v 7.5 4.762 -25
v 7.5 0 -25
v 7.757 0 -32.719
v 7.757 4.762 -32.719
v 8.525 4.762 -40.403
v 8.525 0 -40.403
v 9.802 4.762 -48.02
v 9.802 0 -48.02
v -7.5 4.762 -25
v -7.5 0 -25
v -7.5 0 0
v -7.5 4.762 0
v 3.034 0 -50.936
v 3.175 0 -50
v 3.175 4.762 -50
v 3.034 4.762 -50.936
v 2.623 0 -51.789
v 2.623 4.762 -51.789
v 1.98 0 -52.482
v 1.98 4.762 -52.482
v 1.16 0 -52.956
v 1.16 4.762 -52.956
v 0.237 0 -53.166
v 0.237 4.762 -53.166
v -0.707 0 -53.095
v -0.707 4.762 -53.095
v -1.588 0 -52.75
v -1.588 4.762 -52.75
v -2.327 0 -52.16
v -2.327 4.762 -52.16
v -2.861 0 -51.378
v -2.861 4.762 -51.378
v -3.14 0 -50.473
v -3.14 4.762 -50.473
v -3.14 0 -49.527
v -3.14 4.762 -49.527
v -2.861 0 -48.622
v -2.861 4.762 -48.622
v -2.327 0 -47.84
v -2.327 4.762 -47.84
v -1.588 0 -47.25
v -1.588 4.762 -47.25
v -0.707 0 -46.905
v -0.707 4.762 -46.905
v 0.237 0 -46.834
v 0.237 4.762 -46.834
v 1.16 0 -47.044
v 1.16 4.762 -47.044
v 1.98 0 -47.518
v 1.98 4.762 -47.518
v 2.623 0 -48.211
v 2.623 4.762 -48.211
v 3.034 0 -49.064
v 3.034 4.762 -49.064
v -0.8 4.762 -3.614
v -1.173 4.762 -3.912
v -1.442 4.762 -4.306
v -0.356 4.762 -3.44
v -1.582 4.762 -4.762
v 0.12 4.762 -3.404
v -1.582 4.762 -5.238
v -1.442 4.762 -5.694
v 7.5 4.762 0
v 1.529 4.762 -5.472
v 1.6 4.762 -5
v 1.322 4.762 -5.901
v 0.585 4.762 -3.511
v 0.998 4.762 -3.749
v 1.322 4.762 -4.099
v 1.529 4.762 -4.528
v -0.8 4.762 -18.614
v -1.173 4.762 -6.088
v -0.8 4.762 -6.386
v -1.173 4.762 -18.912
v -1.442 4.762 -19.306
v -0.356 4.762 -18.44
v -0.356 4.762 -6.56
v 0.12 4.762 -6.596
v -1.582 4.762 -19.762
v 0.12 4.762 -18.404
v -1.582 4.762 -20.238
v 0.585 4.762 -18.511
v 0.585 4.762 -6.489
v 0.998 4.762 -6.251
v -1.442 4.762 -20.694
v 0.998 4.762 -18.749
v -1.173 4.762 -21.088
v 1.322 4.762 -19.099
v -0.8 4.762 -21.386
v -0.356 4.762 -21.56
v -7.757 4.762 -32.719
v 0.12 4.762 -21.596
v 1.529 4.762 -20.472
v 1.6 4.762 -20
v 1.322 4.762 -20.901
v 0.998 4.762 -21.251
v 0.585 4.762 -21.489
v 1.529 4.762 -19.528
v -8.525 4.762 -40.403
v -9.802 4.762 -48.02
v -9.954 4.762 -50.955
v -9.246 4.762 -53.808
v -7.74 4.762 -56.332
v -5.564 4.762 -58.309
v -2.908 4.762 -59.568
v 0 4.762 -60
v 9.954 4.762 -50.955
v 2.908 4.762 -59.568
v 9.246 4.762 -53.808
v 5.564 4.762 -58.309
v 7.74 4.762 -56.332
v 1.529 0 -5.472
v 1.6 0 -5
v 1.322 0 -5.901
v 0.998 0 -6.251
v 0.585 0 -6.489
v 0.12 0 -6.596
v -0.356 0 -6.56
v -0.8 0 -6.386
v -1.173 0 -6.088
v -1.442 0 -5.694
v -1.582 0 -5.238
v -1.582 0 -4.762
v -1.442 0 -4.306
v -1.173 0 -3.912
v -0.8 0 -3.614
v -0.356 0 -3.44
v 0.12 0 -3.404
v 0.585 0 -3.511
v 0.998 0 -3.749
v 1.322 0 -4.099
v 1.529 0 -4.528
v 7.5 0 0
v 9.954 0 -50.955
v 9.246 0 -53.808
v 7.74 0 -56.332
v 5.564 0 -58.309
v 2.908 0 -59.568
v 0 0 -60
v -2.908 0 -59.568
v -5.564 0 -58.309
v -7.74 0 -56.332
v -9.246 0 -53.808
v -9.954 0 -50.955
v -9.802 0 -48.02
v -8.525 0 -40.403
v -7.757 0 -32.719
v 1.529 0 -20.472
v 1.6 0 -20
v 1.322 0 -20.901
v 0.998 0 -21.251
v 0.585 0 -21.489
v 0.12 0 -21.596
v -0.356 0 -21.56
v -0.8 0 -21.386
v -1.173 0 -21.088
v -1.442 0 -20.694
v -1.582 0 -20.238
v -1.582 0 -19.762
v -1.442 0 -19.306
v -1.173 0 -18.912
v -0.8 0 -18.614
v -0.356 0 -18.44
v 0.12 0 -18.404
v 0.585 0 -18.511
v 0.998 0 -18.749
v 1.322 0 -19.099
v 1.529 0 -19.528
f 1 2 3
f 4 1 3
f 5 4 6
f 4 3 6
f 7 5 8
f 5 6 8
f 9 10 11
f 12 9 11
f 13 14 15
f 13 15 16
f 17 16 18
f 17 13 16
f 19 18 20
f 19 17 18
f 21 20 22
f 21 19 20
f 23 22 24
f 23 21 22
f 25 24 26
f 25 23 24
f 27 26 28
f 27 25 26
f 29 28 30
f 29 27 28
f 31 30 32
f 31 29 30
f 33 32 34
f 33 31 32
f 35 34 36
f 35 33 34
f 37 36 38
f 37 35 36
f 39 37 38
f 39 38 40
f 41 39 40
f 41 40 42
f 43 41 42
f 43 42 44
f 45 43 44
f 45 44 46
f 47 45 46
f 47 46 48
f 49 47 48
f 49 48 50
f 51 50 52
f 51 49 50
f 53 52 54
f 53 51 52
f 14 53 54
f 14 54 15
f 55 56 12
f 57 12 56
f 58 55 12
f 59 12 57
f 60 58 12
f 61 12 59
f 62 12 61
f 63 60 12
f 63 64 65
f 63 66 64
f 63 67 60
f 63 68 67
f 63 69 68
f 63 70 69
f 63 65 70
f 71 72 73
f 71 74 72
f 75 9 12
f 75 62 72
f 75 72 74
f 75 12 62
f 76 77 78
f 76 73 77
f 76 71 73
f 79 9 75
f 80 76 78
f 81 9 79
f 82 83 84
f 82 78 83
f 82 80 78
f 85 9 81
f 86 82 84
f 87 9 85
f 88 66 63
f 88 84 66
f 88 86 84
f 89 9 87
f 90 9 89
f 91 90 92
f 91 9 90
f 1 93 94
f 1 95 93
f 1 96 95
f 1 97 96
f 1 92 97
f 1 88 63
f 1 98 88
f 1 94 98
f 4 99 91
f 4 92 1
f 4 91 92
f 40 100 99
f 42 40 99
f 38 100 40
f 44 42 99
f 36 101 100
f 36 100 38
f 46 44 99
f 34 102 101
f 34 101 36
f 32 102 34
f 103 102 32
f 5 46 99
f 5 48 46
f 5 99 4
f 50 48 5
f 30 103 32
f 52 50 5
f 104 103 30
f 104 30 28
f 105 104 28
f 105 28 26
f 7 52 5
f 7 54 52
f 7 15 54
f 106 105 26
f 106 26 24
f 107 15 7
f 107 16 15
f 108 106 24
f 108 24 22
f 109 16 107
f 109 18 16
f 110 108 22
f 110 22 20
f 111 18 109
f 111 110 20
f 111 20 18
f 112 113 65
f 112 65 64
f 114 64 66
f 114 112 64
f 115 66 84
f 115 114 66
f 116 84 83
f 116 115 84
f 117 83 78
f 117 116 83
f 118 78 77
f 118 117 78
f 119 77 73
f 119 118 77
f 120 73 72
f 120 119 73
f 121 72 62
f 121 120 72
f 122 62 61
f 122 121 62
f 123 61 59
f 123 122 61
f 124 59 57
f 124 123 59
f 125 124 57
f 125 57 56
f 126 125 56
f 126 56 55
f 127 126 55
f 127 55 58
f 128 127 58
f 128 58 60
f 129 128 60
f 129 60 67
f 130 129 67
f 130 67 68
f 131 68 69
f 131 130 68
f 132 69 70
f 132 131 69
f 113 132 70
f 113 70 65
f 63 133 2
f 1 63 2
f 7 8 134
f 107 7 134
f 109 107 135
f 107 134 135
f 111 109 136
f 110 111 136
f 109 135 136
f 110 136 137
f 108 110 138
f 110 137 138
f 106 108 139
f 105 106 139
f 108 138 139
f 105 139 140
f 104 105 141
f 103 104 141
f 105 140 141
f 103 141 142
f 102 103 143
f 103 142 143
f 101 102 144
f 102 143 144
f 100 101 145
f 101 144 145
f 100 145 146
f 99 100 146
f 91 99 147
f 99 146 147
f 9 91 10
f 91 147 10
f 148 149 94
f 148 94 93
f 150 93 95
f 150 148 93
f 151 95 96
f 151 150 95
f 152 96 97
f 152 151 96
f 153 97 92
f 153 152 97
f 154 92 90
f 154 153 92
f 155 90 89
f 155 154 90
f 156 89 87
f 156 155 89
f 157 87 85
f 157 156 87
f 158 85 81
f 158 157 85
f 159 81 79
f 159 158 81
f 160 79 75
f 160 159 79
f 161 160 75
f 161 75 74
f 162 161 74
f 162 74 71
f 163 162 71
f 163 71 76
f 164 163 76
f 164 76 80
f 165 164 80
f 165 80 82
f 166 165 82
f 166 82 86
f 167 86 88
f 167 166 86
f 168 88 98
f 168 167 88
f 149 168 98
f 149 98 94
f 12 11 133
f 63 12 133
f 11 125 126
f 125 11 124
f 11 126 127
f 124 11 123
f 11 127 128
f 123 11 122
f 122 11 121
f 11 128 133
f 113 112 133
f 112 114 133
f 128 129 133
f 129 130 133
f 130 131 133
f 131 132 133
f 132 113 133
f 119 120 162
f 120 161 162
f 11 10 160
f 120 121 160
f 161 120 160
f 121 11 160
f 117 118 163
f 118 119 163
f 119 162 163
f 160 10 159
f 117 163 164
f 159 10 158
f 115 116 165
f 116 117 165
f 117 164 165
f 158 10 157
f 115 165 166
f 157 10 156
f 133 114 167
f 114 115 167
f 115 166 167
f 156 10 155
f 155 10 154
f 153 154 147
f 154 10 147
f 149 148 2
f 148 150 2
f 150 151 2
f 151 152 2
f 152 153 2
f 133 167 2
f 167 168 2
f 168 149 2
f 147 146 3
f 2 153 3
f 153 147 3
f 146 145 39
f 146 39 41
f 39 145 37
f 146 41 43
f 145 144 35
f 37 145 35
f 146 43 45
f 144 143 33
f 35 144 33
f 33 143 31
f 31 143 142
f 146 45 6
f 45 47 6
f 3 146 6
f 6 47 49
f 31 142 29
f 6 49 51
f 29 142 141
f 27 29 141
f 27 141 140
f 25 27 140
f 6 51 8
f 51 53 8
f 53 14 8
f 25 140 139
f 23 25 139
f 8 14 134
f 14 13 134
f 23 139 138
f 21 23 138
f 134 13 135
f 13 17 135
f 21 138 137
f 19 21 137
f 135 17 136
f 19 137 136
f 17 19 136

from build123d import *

# Parameters (mm, degrees)
SKETCH1_R           = 3.175
SKETCH1_R_2         = 1.6
BOSS_EXTRUDE1_DEPTH = 4.7625


with BuildPart() as part:
    # Sketch1 → Boss-Extrude1 (new body)
    with BuildSketch(Plane(origin=(0, 0, 0), x_dir=(1, 0, 0), z_dir=(0, 1, 0))):
        with BuildLine():
            Line((-7.5, 0), (7.5, 0))
            Line((7.5, 0), (7.5, 25))
            ThreePointArc((7.5, 25), (8.076926638, 36.567307336), (9.801980198, 48.01980198))
            ThreePointArc((9.801980198, 48.01980198), (0, 60), (-9.801980198, 48.01980198))
            ThreePointArc((-9.801980198, 48.01980198), (-8.076926638, 36.567307336), (-7.5, 25))
            Line((-7.5, 25), (-7.5, 0))
        make_face()
        with Locations((0, 50)):
            Circle(SKETCH1_R, mode=Mode.SUBTRACT)
        with Locations((0, 5)):
            Circle(SKETCH1_R_2, mode=Mode.SUBTRACT)
        with Locations((0, 20)):
            Circle(SKETCH1_R_2, mode=Mode.SUBTRACT)
    extrude(amount=BOSS_EXTRUDE1_DEPTH)


solid = part.part
